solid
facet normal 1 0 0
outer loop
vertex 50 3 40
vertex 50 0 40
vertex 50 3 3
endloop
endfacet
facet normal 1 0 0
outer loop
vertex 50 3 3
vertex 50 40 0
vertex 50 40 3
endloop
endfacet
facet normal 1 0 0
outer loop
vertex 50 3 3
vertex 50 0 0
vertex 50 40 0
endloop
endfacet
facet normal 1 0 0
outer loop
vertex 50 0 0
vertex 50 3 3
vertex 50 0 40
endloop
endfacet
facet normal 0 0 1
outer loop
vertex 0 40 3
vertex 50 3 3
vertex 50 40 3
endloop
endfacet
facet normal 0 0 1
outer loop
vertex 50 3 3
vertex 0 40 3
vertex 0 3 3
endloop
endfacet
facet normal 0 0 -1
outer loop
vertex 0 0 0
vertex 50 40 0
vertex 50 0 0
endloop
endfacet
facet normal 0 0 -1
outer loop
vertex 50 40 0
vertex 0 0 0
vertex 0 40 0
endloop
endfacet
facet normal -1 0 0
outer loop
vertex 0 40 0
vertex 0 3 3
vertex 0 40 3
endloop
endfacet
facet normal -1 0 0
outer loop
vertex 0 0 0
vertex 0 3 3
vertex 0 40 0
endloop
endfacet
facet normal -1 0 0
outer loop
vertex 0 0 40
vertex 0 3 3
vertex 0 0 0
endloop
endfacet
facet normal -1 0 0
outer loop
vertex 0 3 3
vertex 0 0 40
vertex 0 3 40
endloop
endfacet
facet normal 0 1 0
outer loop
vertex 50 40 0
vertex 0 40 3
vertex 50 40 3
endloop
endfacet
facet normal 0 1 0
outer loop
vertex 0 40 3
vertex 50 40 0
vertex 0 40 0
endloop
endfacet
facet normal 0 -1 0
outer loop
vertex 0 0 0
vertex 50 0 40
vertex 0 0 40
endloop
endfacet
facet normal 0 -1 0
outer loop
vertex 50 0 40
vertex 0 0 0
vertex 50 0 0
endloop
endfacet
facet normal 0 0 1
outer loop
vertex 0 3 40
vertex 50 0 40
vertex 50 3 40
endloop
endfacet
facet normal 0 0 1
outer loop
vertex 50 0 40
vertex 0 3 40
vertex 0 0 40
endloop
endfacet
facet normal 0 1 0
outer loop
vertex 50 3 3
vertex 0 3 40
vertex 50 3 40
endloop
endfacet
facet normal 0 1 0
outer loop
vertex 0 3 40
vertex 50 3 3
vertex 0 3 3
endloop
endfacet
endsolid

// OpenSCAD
// Parameters
width = 50;
depth = 40;
height = 40;
thickness = 3;

hole_dia = 4.5;
countersink_dia = 8;
countersink_depth = 2;
hole_margin = 10;

// L-Bracket Body
union() {
    // Horizontal flange (XY plane, extending +Y)
    cube([width, depth, thickness]);
    
    // Vertical flange (XZ plane, extending +Z)
    cube([width, thickness, height]);
}

// Module for a countersunk hole
module countersunk_hole() {
    union() {
        // Through hole
        cylinder(d = hole_dia, h = thickness + 2, center = false);
        // Countersink (cone)
        translate([0, 0, thickness])
            cylinder(d1 = hole_dia, d2 = countersink_dia, h = countersink_depth);
    }
}

// Subtract holes
difference() {
    // The body is already defined above, but for difference we need to group it
    union() {
        cube([width, depth, thickness]);
        cube([width, thickness, height]);
    }

    // Holes on Horizontal surface (Top side, looking down -Z)
    // Since the body is 0 to thickness, the countersink must be at the top.
    // To flip the countersink to the top, we rotate the hole module.
    for (x = [hole_margin, width - hole_margin]) {
        translate([x, depth / 2, thickness])
            rotate([180, 0, 0])
                countersunk_hole();
    }

    // Holes on Vertical surface (Front side, looking -Y)
    // The vertical face is at Y=0 to thickness. 
    // The countersink must be at Y=0 (outer side).
    for (x = [hole_margin, width - hole_margin]) {
        translate([x, 0, height / 2])
            rotate([0, -90, 0])
                countersunk_hole();
    }
}
